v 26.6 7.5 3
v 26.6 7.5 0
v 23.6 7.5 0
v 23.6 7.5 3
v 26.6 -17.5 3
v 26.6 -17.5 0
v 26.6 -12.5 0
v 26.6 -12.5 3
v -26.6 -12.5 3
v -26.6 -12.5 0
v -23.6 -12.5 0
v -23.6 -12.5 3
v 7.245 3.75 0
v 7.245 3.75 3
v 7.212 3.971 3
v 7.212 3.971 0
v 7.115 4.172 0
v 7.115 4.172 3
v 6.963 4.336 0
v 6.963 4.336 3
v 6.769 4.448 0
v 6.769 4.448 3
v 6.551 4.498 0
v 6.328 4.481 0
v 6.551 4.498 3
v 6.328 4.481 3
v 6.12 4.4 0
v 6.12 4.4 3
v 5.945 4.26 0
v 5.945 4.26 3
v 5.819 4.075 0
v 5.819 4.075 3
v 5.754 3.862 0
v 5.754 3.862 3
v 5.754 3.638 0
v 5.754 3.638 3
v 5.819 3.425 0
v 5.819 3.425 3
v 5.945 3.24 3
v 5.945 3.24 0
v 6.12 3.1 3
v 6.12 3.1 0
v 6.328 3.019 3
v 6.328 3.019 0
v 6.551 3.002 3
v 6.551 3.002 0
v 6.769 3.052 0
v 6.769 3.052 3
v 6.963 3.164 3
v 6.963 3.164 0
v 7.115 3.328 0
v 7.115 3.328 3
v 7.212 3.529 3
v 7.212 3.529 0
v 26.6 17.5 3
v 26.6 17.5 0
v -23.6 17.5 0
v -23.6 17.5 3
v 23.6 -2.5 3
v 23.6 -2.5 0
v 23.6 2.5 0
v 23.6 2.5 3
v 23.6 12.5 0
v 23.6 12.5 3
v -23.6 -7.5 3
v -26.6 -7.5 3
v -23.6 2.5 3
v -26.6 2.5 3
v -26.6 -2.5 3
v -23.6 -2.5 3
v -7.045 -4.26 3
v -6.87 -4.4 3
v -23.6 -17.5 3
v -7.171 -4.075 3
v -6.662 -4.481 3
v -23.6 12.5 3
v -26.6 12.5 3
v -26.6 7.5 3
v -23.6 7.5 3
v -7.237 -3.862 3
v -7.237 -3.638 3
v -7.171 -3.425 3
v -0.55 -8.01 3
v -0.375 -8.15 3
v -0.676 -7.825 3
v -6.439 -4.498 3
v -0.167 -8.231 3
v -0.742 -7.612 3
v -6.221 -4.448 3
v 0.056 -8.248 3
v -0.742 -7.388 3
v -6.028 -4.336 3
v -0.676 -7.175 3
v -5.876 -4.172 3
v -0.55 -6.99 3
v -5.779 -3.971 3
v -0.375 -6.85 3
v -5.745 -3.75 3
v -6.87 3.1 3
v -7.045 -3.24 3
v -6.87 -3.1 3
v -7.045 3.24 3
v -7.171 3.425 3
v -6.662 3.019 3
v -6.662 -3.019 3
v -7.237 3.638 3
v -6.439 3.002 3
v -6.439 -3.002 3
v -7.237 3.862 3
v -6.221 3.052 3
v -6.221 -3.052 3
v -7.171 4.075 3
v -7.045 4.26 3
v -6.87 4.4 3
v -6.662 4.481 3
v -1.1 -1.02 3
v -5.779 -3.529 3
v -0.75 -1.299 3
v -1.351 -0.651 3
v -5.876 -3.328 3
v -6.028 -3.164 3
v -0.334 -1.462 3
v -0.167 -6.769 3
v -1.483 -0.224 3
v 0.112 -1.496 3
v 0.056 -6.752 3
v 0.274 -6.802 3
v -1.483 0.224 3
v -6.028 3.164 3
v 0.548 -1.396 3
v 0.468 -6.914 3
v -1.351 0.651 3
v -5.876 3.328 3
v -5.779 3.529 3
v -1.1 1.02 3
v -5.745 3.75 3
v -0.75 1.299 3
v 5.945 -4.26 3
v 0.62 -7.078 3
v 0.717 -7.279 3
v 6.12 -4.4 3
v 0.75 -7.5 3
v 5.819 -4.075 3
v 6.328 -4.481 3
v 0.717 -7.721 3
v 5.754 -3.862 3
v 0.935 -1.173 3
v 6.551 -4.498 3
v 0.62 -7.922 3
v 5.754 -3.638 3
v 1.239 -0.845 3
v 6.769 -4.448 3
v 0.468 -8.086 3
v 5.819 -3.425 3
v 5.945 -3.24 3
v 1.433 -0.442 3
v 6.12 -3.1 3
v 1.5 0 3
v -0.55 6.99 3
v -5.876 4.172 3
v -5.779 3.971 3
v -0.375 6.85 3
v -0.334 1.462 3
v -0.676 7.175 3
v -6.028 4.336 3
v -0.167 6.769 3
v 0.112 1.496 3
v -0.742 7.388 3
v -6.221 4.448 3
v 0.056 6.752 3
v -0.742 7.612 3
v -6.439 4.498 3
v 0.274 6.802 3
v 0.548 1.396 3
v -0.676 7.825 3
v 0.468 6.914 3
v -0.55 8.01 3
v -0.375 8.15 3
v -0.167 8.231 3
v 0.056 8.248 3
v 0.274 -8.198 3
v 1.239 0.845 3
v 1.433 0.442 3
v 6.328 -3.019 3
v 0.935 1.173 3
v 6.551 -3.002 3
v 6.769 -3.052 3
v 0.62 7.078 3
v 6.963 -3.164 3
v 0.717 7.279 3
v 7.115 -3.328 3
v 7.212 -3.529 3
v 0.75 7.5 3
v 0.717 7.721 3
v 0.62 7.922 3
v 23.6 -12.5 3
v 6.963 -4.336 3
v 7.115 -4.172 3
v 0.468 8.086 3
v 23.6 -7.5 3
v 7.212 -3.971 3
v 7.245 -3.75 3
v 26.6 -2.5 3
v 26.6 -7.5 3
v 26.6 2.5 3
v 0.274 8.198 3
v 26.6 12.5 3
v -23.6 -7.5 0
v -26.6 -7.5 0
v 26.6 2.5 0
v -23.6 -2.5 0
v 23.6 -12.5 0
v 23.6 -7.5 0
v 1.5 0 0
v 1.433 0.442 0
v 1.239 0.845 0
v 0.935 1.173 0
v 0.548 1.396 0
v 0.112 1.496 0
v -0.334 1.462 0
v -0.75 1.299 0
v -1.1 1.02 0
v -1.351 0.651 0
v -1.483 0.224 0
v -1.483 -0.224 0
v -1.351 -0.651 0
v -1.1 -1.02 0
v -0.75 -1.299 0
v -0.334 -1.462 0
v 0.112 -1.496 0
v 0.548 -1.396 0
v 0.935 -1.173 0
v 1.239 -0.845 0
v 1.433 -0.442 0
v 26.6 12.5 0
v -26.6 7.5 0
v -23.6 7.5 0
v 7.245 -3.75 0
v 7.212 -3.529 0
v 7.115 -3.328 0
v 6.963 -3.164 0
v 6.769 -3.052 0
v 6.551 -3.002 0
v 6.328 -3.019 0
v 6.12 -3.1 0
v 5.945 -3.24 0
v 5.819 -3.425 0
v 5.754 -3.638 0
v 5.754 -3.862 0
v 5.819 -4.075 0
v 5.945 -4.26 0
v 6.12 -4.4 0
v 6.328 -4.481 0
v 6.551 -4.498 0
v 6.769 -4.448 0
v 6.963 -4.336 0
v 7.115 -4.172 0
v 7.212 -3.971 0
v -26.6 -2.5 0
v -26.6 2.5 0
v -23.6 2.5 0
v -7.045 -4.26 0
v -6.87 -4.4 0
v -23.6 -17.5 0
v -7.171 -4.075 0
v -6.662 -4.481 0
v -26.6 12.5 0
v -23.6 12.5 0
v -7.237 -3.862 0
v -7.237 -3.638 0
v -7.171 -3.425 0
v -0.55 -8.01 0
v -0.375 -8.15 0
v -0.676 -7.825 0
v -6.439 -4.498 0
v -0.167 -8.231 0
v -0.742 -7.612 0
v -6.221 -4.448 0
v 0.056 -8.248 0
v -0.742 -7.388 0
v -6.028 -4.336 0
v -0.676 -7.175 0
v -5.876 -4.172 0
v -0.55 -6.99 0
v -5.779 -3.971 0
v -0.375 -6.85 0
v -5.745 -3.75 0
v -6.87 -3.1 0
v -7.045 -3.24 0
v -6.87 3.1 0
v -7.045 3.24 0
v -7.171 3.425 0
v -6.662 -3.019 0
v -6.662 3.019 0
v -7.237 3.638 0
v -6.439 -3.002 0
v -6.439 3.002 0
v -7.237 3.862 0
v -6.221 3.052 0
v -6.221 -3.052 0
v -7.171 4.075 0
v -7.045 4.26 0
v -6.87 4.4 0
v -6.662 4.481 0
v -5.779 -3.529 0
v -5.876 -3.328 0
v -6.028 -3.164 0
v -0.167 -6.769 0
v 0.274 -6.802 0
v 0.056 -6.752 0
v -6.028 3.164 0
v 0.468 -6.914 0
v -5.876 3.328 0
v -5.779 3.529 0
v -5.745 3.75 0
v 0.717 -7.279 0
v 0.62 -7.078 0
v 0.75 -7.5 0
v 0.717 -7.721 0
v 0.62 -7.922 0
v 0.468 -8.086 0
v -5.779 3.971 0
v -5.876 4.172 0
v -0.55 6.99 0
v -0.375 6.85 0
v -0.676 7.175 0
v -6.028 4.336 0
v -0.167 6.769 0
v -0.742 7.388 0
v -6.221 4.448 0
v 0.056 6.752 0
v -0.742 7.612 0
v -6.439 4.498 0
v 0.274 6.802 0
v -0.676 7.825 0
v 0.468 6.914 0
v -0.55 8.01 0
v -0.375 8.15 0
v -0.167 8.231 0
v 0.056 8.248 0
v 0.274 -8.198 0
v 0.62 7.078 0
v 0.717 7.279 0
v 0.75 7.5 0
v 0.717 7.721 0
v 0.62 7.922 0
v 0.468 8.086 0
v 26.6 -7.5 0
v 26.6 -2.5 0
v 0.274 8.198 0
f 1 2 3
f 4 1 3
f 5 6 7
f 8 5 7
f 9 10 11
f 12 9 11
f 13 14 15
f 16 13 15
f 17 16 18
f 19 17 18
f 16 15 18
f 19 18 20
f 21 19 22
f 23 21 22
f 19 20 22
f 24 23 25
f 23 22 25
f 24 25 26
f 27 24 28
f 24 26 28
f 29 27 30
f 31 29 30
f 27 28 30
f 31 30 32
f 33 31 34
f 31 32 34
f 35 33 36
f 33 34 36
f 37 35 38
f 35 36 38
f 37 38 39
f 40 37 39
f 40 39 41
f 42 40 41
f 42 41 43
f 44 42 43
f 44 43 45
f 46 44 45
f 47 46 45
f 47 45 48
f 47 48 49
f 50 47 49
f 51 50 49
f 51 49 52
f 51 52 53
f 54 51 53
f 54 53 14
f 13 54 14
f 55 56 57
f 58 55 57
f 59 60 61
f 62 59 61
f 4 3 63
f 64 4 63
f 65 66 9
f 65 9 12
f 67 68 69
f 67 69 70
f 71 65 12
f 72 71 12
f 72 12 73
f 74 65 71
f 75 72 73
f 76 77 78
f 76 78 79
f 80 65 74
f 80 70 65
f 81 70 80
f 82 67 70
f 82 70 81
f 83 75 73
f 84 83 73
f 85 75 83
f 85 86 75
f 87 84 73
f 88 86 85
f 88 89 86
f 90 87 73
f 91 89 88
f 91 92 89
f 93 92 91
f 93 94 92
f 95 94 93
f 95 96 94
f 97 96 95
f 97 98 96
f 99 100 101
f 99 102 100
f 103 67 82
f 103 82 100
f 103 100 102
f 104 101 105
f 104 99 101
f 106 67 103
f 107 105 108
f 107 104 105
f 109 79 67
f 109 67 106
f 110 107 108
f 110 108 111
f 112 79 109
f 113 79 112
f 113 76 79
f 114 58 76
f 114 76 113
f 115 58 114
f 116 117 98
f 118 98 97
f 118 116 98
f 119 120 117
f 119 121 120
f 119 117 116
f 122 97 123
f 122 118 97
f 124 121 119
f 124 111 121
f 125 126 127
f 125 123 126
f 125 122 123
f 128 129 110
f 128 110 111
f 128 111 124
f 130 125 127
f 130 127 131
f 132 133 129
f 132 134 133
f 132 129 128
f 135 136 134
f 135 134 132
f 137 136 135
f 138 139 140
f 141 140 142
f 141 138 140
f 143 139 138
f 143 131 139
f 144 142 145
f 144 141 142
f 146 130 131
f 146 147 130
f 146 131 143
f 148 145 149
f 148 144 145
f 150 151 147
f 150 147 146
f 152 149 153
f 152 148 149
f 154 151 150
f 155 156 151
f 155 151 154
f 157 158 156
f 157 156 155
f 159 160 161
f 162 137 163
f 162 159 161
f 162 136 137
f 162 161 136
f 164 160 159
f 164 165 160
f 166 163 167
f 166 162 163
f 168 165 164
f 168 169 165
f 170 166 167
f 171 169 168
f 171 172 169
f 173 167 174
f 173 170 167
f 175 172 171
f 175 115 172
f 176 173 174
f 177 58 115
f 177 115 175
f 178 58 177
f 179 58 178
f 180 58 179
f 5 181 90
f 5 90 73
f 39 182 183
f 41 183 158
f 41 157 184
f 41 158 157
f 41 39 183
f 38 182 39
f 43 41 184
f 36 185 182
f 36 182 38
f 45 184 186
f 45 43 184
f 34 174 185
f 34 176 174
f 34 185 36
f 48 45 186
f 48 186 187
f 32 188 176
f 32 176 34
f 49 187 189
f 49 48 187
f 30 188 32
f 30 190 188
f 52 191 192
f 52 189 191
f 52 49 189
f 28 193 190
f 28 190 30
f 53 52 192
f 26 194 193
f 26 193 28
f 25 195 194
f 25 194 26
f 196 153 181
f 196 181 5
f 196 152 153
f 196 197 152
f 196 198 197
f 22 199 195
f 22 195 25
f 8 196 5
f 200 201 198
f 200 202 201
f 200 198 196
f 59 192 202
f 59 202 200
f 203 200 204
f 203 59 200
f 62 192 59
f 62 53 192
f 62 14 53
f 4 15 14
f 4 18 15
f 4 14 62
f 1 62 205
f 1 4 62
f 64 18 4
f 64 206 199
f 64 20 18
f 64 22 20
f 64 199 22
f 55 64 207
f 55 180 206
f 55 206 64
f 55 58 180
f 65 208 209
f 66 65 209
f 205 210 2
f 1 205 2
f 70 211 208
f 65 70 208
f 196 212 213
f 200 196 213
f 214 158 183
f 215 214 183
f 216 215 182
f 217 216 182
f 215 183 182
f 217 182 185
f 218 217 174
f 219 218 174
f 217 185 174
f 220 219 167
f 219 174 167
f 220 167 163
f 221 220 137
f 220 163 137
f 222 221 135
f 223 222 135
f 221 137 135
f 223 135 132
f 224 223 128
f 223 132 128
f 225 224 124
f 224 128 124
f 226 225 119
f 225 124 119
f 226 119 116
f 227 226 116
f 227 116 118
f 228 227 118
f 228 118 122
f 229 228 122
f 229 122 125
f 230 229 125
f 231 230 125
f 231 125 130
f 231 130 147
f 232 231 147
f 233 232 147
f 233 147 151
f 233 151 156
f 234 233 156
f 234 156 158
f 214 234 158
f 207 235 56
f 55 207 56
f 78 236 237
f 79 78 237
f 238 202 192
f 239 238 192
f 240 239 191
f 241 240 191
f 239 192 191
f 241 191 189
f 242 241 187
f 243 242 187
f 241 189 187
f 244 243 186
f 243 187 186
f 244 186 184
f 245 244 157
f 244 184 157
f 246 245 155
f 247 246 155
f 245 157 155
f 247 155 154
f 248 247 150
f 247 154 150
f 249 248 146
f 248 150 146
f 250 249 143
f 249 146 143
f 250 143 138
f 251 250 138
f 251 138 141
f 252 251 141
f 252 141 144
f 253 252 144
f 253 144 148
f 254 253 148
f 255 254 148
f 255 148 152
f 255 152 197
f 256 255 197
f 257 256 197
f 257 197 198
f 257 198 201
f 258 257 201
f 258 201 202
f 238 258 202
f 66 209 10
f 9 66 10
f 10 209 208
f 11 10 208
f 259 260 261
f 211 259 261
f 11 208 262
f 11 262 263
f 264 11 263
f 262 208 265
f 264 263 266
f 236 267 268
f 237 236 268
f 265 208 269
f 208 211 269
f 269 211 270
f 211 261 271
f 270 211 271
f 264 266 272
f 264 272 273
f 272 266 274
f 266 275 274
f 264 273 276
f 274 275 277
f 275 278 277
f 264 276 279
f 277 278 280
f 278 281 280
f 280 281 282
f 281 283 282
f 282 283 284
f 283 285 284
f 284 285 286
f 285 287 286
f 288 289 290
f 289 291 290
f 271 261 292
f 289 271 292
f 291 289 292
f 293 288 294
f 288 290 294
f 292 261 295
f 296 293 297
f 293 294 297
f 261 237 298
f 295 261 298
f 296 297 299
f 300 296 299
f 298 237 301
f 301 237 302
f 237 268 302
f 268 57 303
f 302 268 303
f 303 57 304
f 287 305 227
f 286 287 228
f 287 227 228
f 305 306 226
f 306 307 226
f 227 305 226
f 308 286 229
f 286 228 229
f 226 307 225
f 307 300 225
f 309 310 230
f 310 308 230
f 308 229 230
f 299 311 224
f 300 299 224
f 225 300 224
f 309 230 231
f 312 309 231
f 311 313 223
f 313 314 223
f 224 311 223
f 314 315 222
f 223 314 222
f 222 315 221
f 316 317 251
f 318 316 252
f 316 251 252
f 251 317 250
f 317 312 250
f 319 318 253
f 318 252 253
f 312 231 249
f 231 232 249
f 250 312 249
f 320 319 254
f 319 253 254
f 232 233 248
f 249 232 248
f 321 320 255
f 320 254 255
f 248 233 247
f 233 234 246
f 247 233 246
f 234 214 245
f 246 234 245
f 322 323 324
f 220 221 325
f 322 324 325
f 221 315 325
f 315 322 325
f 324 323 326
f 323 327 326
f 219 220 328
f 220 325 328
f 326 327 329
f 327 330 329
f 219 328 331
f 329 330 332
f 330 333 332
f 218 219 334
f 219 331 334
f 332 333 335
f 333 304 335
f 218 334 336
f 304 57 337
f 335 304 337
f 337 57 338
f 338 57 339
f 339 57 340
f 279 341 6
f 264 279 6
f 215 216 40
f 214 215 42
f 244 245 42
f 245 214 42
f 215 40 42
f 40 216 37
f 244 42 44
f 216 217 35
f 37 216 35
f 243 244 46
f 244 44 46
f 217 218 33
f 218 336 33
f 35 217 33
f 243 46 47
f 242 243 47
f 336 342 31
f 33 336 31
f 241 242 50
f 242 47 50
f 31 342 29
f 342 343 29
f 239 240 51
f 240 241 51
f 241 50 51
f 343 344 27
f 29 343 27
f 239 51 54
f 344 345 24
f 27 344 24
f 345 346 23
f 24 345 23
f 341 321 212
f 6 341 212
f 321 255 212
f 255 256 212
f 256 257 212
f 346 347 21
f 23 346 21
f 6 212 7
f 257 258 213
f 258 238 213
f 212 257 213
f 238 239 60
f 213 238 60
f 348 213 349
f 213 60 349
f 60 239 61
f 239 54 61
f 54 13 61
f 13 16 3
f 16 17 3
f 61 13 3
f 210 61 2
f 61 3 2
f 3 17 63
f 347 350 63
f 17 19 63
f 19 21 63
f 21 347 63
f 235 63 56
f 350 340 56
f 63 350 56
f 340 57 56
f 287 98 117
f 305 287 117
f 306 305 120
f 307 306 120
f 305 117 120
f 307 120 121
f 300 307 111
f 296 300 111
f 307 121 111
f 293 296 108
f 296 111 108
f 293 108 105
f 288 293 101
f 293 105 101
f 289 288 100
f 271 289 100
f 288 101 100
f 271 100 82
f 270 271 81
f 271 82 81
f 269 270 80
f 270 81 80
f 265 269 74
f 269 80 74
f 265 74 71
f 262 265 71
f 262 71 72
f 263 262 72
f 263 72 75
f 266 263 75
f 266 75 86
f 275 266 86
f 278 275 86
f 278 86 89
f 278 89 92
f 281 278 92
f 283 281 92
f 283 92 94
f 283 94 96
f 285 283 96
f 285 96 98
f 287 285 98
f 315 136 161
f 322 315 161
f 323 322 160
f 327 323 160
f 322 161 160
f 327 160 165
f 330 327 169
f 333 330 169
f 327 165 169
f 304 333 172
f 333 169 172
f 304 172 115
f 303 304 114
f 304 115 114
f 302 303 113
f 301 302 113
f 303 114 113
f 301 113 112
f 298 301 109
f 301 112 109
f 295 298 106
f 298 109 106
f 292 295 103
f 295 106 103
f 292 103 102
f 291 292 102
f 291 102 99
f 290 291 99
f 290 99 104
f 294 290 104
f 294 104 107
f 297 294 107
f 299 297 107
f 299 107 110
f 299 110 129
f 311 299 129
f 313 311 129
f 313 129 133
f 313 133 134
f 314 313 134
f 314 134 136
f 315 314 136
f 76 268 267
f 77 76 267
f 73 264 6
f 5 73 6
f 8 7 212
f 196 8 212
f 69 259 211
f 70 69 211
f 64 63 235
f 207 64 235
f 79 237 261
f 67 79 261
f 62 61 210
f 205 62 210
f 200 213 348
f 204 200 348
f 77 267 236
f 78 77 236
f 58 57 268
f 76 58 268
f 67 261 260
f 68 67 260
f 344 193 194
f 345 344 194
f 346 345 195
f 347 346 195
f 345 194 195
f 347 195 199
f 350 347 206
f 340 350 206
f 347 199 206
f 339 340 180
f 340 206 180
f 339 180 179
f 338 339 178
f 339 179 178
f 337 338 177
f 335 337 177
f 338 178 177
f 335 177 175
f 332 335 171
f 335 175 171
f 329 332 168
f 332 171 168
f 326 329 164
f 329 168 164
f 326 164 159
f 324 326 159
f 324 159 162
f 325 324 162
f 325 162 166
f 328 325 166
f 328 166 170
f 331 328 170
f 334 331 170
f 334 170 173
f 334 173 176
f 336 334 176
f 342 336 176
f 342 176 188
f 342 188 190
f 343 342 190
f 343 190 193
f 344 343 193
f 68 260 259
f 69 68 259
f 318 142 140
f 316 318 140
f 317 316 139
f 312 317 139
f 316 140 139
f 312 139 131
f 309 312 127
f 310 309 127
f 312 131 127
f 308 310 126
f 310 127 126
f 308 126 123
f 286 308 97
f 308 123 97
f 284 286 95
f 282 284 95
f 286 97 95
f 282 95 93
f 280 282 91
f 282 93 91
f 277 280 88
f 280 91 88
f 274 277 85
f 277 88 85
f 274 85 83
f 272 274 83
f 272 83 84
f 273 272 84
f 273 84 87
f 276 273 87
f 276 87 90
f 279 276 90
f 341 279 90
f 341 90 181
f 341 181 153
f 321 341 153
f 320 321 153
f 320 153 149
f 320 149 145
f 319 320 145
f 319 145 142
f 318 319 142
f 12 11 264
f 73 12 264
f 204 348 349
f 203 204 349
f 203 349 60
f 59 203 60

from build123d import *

# Parameters (mm, degrees)
SALIENTE_EXTRUIR1_DEPTH = 3
CORTAR_EXTRUIR1_REACH   = 33.981
CROQUIS2_R              = 0.75
CROQUIS2_R_2            = 1.5


with BuildPart() as part:
    # Croquis1 → Saliente-Extruir1 (new body)
    with BuildSketch(Plane.XY):
        Polygon((26.6, 2.5), (26.6, 7.5), (23.6, 7.5), (23.6, 12.5), (26.6, 12.5), (26.6, 17.5), (26.581338058, 17.5), (-23.6, 17.5), (-23.6, 12.5), (-26.6, 12.5), (-26.6, 7.5), (-23.6, 7.5), (-23.6, 2.5), (-26.6, 2.5), (-26.6, -2.5), (-23.6, -2.5), (-23.6, -7.5), (-26.6, -7.5), (-26.6, -12.5), (-23.6, -12.5), (-23.6, -17.5), (26.6, -17.5), (26.6, -12.5), (23.6, -12.5), (23.6, -7.5), (26.6, -7.5), (26.6, -2.5), (23.6, -2.5), (23.6, 2.5), align=None)
    extrude(amount=SALIENTE_EXTRUIR1_DEPTH)

    # Croquis2 → Cortar-Extruir1 (cut, up to next)
    with BuildSketch(Plane.XY.offset(3), mode=Mode.PRIVATE) as cortar_extruir1_sk1:
        with Locations((0, 7.5)):
            Circle(CROQUIS2_R)
    cortar_extruir1_tool1 = extrude(cortar_extruir1_sk1.sketch, amount=-CORTAR_EXTRUIR1_REACH, mode=Mode.PRIVATE) & part.part
    # Croquis2 → Cortar-Extruir1 (cut, up to next)
    with BuildSketch(Plane.XY.offset(3), mode=Mode.PRIVATE) as cortar_extruir1_sk2:
        with Locations((6.495190528, 3.75)):
            Circle(CROQUIS2_R)
    cortar_extruir1_tool2 = extrude(cortar_extruir1_sk2.sketch, amount=-CORTAR_EXTRUIR1_REACH, mode=Mode.PRIVATE) & part.part
    # Croquis2 → Cortar-Extruir1 (cut, up to next)
    with BuildSketch(Plane.XY.offset(3), mode=Mode.PRIVATE) as cortar_extruir1_sk3:
        with Locations((6.495190528, -3.75)):
            Circle(CROQUIS2_R)
    cortar_extruir1_tool3 = extrude(cortar_extruir1_sk3.sketch, amount=-CORTAR_EXTRUIR1_REACH, mode=Mode.PRIVATE) & part.part
    # Croquis2 → Cortar-Extruir1 (cut, up to next)
    with BuildSketch(Plane.XY.offset(3), mode=Mode.PRIVATE) as cortar_extruir1_sk4:
        with Locations((0, -7.5)):
            Circle(CROQUIS2_R)
    cortar_extruir1_tool4 = extrude(cortar_extruir1_sk4.sketch, amount=-CORTAR_EXTRUIR1_REACH, mode=Mode.PRIVATE) & part.part
    # Croquis2 → Cortar-Extruir1 (cut, up to next)
    with BuildSketch(Plane.XY.offset(3), mode=Mode.PRIVATE) as cortar_extruir1_sk5:
        with Locations((-6.495190528, -3.75)):
            Circle(CROQUIS2_R)
    cortar_extruir1_tool5 = extrude(cortar_extruir1_sk5.sketch, amount=-CORTAR_EXTRUIR1_REACH, mode=Mode.PRIVATE) & part.part
    # Croquis2 → Cortar-Extruir1 (cut, up to next)
    with BuildSketch(Plane.XY.offset(3), mode=Mode.PRIVATE) as cortar_extruir1_sk6:
        with Locations((-6.495190528, 3.75)):
            Circle(CROQUIS2_R)
    cortar_extruir1_tool6 = extrude(cortar_extruir1_sk6.sketch, amount=-CORTAR_EXTRUIR1_REACH, mode=Mode.PRIVATE) & part.part
    # Croquis2 → Cortar-Extruir1 (cut, up to next)
    with BuildSketch(Plane.XY.offset(3), mode=Mode.PRIVATE) as cortar_extruir1_sk7:
        Circle(CROQUIS2_R_2)
    cortar_extruir1_tool7 = extrude(cortar_extruir1_sk7.sketch, amount=-CORTAR_EXTRUIR1_REACH, mode=Mode.PRIVATE) & part.part
    add(cortar_extruir1_tool1.solids().sort_by_distance((0, 7.5, 3))[0], mode=Mode.SUBTRACT)
    add(cortar_extruir1_tool2.solids().sort_by_distance((6.495191, 3.75, 3))[0], mode=Mode.SUBTRACT)
    add(cortar_extruir1_tool3.solids().sort_by_distance((6.495191, -3.75, 3))[0], mode=Mode.SUBTRACT)
    add(cortar_extruir1_tool4.solids().sort_by_distance((0, -7.5, 3))[0], mode=Mode.SUBTRACT)
    add(cortar_extruir1_tool5.solids().sort_by_distance((-6.495191, -3.75, 3))[0], mode=Mode.SUBTRACT)
    add(cortar_extruir1_tool6.solids().sort_by_distance((-6.495191, 3.75, 3))[0], mode=Mode.SUBTRACT)
    add(cortar_extruir1_tool7.solids().sort_by_distance((0, 0, 3))[0], mode=Mode.SUBTRACT)


solid = part.part
